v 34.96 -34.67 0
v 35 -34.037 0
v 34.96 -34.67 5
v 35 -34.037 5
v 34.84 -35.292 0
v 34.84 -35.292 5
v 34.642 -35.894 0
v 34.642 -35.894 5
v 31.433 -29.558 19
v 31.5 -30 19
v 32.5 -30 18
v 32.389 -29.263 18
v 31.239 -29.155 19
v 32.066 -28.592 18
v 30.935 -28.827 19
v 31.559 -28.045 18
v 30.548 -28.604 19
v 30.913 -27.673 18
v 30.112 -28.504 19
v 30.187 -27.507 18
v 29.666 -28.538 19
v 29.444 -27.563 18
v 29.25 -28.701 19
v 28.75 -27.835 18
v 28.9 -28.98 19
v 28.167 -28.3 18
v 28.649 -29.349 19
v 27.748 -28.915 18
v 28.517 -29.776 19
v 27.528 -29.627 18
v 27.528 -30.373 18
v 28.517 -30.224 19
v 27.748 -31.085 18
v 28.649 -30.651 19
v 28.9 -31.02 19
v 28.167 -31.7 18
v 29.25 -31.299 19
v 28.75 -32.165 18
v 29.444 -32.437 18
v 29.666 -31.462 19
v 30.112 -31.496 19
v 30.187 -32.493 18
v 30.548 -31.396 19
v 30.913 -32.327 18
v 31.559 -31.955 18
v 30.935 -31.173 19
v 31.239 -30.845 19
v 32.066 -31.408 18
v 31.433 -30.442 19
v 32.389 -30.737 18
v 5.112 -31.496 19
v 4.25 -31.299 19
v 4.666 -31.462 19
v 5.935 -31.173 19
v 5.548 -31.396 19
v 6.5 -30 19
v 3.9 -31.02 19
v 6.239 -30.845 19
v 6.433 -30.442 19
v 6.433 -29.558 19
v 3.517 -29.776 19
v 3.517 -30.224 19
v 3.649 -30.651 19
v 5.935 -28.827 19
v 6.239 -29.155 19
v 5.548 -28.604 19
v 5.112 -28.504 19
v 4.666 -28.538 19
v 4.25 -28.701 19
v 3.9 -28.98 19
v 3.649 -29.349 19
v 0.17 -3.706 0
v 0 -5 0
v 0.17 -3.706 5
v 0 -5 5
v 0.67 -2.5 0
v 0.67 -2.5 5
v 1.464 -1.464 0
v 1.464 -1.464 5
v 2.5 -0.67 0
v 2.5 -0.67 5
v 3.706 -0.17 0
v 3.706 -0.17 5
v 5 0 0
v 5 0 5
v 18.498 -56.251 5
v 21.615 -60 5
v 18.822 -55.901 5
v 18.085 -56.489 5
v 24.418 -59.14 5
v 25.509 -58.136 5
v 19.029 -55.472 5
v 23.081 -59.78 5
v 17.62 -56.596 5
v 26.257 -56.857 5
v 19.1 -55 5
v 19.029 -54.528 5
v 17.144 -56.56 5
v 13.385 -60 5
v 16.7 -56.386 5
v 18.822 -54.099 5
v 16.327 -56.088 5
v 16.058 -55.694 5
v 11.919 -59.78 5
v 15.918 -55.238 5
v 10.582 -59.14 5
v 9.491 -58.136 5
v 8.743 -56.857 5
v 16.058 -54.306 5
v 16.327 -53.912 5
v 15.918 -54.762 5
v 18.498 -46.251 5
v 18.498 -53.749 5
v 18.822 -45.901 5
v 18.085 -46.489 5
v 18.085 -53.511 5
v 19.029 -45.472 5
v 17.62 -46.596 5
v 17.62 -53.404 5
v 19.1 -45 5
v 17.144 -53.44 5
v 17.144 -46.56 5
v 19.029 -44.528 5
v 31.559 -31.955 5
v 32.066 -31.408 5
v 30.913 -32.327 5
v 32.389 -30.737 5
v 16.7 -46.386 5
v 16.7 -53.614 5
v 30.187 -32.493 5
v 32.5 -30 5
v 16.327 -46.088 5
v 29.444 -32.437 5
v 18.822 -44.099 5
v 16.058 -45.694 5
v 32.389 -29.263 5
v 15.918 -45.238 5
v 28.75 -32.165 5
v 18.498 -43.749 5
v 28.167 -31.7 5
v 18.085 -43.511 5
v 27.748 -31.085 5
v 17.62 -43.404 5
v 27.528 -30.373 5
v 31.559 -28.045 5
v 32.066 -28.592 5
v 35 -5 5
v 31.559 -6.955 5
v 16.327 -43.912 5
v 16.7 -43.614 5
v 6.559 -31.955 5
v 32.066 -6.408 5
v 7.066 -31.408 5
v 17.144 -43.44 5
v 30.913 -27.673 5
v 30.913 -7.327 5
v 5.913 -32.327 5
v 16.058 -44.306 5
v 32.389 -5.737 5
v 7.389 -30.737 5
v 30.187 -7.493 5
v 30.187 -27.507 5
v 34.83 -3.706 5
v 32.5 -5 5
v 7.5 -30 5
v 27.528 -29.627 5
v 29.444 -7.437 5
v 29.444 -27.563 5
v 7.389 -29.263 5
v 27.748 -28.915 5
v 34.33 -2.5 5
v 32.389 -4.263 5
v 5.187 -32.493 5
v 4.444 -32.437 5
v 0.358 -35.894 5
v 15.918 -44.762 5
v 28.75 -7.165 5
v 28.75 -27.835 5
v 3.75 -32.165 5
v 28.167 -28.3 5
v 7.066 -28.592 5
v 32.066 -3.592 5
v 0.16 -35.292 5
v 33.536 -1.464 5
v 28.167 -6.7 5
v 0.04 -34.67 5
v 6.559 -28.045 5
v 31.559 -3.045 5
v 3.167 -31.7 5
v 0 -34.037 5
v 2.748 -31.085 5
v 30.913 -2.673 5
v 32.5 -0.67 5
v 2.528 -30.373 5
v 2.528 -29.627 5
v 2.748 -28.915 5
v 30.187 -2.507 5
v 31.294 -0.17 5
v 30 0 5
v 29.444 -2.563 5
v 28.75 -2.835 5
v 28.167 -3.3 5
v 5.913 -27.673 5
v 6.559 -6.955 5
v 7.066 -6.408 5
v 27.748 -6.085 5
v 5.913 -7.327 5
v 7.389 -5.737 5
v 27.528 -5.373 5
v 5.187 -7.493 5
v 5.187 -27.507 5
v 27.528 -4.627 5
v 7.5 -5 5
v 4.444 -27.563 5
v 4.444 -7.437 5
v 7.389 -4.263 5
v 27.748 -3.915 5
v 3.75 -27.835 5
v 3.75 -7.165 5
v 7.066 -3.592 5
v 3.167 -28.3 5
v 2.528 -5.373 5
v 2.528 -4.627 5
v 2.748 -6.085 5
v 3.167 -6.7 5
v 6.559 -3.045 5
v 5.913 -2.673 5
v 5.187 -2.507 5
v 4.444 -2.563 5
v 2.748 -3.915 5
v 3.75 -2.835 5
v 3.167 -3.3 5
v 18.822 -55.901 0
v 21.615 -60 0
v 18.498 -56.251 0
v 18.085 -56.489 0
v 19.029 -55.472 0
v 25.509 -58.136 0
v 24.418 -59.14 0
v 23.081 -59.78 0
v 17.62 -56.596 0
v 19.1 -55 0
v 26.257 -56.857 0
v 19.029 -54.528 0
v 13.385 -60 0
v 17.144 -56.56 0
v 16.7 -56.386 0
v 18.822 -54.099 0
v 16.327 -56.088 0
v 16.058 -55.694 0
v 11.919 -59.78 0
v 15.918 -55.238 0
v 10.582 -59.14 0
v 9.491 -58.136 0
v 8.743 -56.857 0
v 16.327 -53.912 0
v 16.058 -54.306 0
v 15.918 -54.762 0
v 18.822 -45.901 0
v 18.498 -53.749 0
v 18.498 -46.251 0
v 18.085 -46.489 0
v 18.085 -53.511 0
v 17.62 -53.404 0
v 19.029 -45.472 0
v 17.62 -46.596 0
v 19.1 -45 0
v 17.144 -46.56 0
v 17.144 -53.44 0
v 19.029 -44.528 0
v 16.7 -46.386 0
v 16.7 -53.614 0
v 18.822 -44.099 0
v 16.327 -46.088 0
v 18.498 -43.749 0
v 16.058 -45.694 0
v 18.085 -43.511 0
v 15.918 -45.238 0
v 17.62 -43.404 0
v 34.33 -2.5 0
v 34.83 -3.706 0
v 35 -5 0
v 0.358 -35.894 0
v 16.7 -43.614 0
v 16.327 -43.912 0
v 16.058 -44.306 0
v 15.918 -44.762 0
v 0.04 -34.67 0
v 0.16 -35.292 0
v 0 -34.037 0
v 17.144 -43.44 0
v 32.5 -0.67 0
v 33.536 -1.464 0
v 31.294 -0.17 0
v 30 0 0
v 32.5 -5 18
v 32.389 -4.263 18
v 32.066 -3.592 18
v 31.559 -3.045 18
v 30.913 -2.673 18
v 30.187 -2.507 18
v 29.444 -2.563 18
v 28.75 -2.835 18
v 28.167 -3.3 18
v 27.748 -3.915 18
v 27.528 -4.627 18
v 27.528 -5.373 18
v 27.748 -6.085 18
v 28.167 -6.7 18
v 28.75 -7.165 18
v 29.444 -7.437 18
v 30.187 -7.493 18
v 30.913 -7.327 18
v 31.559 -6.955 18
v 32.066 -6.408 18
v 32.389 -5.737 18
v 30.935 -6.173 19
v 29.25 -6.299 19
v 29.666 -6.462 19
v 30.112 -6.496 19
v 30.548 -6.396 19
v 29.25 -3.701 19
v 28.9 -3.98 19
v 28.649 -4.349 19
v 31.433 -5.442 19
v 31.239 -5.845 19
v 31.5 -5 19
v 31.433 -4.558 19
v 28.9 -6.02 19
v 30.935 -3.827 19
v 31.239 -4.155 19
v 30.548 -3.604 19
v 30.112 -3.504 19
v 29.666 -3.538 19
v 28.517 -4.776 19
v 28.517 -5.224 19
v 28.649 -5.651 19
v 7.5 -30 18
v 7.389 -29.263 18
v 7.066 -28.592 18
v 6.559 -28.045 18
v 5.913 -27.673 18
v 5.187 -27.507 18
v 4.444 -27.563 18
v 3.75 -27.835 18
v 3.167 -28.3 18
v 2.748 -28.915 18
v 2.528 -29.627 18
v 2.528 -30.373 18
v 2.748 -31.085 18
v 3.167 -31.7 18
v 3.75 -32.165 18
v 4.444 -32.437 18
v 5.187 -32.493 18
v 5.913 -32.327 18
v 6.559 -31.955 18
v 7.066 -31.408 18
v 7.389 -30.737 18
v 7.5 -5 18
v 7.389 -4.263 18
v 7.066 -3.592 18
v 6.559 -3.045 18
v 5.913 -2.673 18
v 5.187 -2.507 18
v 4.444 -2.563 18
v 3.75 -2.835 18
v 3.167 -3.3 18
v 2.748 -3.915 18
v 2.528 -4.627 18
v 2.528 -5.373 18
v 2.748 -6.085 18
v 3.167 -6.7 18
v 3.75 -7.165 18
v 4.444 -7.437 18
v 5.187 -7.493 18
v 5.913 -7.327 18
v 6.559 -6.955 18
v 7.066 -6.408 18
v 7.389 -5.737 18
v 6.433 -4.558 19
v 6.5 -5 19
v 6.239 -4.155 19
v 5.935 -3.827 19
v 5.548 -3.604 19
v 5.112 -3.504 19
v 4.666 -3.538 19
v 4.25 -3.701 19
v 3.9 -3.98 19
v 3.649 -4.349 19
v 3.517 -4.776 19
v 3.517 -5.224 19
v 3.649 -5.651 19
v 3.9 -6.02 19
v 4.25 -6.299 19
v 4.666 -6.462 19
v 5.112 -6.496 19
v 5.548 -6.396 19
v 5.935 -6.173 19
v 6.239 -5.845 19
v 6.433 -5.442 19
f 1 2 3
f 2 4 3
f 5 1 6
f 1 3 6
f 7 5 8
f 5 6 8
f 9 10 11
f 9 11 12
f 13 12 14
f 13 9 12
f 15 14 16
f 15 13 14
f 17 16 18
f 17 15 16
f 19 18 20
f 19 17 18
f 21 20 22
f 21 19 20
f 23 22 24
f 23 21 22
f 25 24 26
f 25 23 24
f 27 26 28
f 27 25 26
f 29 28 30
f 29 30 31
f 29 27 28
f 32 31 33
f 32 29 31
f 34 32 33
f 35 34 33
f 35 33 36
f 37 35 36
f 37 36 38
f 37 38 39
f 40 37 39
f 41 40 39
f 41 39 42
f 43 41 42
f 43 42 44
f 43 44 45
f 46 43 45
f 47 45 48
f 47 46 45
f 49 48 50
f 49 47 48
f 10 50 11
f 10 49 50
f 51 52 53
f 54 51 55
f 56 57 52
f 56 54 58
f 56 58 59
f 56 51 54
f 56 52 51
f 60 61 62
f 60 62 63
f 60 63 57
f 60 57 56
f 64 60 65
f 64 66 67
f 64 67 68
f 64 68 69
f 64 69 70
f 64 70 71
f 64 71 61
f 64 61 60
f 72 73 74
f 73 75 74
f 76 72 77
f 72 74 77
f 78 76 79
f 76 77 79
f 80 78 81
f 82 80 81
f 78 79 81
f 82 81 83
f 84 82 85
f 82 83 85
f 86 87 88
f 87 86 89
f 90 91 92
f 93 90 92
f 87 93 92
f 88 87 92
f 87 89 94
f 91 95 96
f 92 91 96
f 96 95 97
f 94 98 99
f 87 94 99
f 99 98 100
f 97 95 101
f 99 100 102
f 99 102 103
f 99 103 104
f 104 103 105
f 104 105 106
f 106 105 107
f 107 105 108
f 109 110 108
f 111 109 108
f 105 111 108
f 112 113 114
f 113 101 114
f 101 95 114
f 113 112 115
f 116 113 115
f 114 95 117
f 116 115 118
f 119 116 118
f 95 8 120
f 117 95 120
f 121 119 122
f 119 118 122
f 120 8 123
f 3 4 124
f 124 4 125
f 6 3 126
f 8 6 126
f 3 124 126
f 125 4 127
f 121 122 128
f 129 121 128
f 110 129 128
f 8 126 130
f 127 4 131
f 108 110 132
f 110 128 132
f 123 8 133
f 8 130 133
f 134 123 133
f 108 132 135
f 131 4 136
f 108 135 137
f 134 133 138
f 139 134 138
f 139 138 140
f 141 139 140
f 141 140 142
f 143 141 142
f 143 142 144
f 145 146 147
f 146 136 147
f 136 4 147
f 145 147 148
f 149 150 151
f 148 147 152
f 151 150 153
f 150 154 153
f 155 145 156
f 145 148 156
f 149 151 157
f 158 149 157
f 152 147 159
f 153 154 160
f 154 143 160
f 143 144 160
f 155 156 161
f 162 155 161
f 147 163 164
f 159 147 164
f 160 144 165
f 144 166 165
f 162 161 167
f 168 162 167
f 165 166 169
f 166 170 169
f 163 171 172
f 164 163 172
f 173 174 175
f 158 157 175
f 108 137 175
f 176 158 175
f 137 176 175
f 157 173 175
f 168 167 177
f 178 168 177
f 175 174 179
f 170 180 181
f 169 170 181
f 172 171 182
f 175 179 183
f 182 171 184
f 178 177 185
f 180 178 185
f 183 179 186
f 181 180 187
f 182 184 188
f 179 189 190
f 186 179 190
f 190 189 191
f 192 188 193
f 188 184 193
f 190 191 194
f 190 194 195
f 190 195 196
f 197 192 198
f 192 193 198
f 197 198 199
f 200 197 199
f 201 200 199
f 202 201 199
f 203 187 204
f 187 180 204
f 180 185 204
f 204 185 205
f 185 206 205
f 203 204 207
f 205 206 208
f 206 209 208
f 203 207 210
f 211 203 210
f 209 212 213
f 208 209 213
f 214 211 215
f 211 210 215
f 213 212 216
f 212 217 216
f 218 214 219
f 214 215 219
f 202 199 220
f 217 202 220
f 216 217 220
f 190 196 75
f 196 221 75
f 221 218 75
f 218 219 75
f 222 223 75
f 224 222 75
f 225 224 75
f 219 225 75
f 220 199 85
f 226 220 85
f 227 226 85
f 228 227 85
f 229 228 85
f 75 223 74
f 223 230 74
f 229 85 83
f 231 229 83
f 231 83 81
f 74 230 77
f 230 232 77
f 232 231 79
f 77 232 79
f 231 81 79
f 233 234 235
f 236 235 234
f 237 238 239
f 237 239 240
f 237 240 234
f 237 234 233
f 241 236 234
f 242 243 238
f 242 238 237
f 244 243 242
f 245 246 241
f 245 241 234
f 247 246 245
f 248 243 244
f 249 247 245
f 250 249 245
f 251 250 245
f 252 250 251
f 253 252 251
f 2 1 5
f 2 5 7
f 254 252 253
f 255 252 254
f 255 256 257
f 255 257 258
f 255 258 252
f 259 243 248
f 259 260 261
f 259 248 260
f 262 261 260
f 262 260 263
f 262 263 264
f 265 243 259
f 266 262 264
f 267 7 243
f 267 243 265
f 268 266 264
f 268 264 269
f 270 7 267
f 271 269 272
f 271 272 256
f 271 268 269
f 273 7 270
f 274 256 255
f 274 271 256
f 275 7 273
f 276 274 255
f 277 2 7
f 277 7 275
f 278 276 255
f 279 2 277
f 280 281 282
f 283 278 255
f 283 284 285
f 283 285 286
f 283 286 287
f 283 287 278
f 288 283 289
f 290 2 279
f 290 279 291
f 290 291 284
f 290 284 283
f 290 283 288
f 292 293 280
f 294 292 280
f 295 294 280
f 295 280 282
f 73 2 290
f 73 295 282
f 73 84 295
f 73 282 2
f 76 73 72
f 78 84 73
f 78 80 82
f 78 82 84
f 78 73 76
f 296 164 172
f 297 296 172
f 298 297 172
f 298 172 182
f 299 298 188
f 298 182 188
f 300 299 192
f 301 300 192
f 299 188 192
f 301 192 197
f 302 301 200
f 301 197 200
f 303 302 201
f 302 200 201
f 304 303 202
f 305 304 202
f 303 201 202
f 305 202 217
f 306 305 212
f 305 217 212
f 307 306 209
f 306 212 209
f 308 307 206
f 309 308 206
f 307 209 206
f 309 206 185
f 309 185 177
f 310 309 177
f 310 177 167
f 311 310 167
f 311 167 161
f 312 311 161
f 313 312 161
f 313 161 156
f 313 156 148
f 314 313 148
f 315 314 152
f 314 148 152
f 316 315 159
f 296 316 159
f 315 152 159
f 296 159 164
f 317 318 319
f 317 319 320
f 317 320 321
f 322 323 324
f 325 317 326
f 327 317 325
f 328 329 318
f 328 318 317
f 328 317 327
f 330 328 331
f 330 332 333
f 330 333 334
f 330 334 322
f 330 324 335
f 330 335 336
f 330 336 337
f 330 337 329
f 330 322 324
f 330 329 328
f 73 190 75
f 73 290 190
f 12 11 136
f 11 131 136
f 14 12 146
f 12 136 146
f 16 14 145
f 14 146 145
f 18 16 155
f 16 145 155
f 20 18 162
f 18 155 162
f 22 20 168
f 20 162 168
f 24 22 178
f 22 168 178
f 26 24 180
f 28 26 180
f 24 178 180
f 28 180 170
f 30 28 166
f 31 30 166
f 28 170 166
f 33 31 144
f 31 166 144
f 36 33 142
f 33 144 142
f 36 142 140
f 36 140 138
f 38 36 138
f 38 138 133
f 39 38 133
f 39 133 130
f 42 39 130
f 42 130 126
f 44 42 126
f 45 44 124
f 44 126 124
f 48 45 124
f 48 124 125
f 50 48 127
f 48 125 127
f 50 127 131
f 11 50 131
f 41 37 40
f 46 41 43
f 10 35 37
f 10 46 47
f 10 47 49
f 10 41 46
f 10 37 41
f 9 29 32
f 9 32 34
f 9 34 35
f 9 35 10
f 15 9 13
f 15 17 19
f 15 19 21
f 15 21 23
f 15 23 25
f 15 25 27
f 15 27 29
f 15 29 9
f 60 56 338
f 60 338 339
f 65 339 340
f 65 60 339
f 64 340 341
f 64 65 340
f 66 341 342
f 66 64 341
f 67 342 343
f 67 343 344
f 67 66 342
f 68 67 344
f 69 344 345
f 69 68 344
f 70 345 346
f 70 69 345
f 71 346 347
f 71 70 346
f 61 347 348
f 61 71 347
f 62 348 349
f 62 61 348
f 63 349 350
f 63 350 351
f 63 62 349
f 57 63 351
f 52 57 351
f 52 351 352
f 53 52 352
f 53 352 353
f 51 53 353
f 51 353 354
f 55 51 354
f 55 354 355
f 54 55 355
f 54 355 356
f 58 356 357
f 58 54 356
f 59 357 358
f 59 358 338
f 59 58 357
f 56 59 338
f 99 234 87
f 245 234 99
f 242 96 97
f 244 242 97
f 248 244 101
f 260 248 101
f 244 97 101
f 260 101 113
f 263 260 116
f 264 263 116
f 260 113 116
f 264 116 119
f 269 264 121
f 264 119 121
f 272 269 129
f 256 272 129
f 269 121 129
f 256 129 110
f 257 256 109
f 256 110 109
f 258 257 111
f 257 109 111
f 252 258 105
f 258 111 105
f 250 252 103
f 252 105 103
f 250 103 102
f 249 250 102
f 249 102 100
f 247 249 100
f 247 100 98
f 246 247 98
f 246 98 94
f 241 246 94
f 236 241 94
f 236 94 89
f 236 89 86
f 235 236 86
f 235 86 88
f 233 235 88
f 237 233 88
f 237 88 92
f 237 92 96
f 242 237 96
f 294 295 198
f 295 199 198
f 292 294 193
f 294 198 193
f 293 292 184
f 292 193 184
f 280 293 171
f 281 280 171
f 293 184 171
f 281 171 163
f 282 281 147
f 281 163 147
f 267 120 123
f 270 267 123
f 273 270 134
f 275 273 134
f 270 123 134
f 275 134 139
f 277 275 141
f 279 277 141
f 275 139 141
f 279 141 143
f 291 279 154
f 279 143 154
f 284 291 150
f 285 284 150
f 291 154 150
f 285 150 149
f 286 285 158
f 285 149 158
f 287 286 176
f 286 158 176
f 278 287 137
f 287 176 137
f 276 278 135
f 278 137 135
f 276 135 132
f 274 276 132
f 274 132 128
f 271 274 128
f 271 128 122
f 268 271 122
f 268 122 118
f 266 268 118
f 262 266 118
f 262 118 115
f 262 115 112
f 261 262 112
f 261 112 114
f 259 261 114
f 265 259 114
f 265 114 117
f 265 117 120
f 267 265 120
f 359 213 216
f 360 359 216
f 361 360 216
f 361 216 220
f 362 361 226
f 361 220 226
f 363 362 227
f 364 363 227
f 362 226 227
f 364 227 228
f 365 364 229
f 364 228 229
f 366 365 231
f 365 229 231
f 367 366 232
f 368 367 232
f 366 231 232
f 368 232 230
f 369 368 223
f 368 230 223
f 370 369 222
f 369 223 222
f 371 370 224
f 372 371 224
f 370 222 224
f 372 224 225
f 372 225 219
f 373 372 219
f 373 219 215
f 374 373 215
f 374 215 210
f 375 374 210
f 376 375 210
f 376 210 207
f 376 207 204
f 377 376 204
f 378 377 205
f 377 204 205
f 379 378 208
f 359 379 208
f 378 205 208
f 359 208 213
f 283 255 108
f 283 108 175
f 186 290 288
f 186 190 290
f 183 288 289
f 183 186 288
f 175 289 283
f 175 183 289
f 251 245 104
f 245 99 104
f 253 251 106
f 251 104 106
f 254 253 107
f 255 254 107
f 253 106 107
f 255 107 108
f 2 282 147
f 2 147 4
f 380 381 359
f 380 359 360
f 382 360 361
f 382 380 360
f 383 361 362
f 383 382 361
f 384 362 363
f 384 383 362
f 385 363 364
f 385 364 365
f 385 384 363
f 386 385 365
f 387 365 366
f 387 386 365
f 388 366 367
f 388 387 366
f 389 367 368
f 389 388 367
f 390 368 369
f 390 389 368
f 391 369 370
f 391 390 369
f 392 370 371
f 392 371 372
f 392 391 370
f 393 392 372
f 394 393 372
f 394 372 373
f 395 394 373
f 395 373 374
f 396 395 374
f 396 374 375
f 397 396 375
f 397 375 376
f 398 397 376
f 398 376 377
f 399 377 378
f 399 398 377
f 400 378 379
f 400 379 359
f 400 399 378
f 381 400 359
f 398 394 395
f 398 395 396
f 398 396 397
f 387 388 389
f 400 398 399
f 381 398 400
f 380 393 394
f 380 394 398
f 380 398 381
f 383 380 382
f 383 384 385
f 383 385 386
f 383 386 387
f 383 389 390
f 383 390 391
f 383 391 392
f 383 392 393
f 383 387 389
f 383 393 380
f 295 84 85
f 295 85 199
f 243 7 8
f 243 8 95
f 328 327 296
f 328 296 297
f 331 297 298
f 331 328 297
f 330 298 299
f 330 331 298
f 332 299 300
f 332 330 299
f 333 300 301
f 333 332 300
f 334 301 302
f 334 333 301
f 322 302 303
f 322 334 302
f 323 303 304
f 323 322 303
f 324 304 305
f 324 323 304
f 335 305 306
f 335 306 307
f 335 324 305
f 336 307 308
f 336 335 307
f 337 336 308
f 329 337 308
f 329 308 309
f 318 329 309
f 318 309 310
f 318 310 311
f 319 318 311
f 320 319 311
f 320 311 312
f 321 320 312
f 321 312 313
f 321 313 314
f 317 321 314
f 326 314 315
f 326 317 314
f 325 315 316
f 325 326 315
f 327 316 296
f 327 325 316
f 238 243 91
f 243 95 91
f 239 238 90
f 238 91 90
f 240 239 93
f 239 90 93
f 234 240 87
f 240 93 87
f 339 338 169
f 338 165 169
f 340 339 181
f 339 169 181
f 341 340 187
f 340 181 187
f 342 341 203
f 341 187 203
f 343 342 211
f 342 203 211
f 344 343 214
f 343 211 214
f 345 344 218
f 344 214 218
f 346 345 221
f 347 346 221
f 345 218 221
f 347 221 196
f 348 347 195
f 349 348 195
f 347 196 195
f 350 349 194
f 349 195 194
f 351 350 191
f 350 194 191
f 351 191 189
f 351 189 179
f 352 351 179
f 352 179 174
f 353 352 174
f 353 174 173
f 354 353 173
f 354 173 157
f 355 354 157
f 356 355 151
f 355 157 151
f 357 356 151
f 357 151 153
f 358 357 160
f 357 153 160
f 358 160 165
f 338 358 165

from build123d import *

# Parameters (mm, degrees)
SKETCH1_W           = 35
SKETCH1_H           = 35
BOSS_EXTRUDE1_DEPTH = 5
SKETCH2_R           = 2.5
BOSS_EXTRUDE2_DEPTH = 14
FILLET1_R           = 5
CHAMFER1_SIZE       = 1
BOSS_EXTRUDE3_DEPTH = 5
SKETCH5_R           = 1.6
CUT_EXTRUDE1_DEPTH  = 14
FILLET2_R           = 5


with BuildPart() as part:
    # Sketch1 → Boss-Extrude1 (new body)
    with BuildSketch(Plane.XY):
        with Locations((17.5, -17.5)):
            Rectangle(SKETCH1_W, SKETCH1_H)
    extrude(amount=BOSS_EXTRUDE1_DEPTH)

    # Sketch2 → Boss-Extrude2 (add)
    with BuildSketch(Plane.XY.offset(5)):
        with Locations((5, -5)):
            Circle(SKETCH2_R)
        with Locations((30, -5)):
            Circle(SKETCH2_R)
        with Locations((30, -30)):
            Circle(SKETCH2_R)
        with Locations((5, -30)):
            Circle(SKETCH2_R)
    extrude(amount=BOSS_EXTRUDE2_DEPTH)

    # Fillet1
    fillet1_edges = [part.edges().sort_by_distance(p)[0] for p in [
        (0, 0, 2.5),
        (0, -35, 2.5),
        (35, -35, 2.5),
        (35, 0, 2.5),
    ]]
    fillet(fillet1_edges, radius=FILLET1_R)

    # Chamfer1
    chamfer1_edges = [part.edges().sort_by_distance(p)[0] for p in [
        (2.5, -5, 19),
        (27.5, -5, 19),
        (27.5, -30, 19),
        (2.5, -30, 19),
    ]]
    chamfer(chamfer1_edges, length=CHAMFER1_SIZE)

    # Sketch3 → Boss-Extrude3 (add)
    with BuildSketch(Plane(origin=(0, 0, 0), x_dir=(-1, 0, 0), z_dir=(0, 0, -1))):
        Polygon((-35, -30), (-35, -35), (-25, -60), (-10, -60), (0, -35), (0, -30), align=None)
    extrude(amount=-BOSS_EXTRUDE3_DEPTH)

    # Sketch5 → Cut-Extrude1 (cut)
    with BuildSketch(Plane.XY.offset(5)):
        with Locations((17.5, -55)):
            Circle(SKETCH5_R)
        with Locations((17.5, -45)):
            Circle(SKETCH5_R)
    extrude(amount=-CUT_EXTRUDE1_DEPTH, mode=Mode.SUBTRACT)

    # Fillet2
    fillet2_edges = [part.edges().sort_by_distance(p)[0] for p in [
        (35, -35, 2.5),
        (25, -60, 2.5),
        (10, -60, 2.5),
        (0, -35, 2.5),
    ]]
    fillet(fillet2_edges, radius=FILLET2_R)


solid = part.part
